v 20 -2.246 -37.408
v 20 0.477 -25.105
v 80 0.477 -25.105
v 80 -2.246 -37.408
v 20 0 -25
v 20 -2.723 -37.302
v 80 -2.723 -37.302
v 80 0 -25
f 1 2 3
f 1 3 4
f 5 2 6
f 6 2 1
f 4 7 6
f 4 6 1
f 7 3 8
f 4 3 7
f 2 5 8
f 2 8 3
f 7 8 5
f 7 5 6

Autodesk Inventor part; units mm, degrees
ref_plane "YZ Plane" through (0, 0, 0) normal (1, 0, 0) x (0, 1, 0)
ref_plane "XZ Plane" through (0, 0, 0) normal (0, 1, 0) x (-1, 0, 0)
ref_plane "XY Plane" through (0, 0, 0) normal (0, 0, 1) x (1, 0, 0)
sketch "Szkic1" plane through (0, 0, 0) normal (0, 1, 0) x (-1, 0, 0)
  line L0 (0, 0) -> (-100, 0)
  line L1 (-100, 0) -> (-100, -14)
  line L2 (-100, -14) -> (0, -14)
  line L3 (0, -14) -> (0, 0)
  dimension "d0" = 100
  dimension "d1" = 14
extrude "Wyciągnięcie proste1" add sketch "Szkic1" along normal blind 0.5
sketch "Szkic2" plane through (0, 0.5, 0) normal (0, 1, 0) x (1, 0, 0)
  line L0 (100, 14) -> (0, 14) projected
  line L1 (80, 14) -> (20, 14)
  line L2 (20, 14) -> (20, 25)
  line L3 (20, 25) -> (80, 25)
  line L4 (80, 25) -> (80, 14)
  point P0 (0, 0)
  point P1 (50, 14)
  point P2 (50, 14)
  point P3 (50, 14)
  dimension "d4" = 60
  dimension "d5" = 11
extrude "Wyciągnięcie proste2" add sketch "Szkic2" against normal blind 0.5
sketch "Szkic3" plane through (80, 0.5, -14) normal (1, 0, 0) x (0, 0, -1)
  line L0 (0, 0) -> (11, 0) projected
  line L1 (0, -0.5) -> (0, 0) projected
  line L2 (11, -0.5) -> (0, -0.5) projected
  line L3 (11, 0) -> (11, -0.5) projected
  line L4 (11, 0) -> (23.4078, -2.7462)
  line L5 (11, -0.5) -> (23.3023, -3.2228)
  line L6 (23.3023, -3.2228) -> (23.4078, -2.7462)
  point P0 (-14, -0.5)
  dimension "d8" = 167.52
  dimension "d9" = 12.6
extrude "Wyciągnięcie proste3" add sketch "Szkic3" against normal up to surface (60 mm away) contours L4 L6 L5 L3
sketch "Szkic4" plane through (20, 0, -14) normal (-1, 0, 0) x (0, 0, 1)
  line L0 (-11, 0.5) -> (0, 0.5) projected
  line L1 (0, 0) -> (-11, 0) projected
  line L2 (0, 0.5) -> (14, 0.5) projected
  line L3 (0, 0) -> (14, 0) projected
  line L4 (0, 0) -> (14, 0) projected
  line L5 (14, 0) -> (14, 0.5) projected
  line L6 (0, 0.5) -> (14, 0.5) projected
  line L7 (0, 0) -> (0, 0.5) projected
  line L8 (-11, 0.5) -> (0, 0.5) projected
  line L9 (-23.4078, -2.2462) -> (-11, 0.5) projected
  line L10 (-23.3023, -2.7228) -> (-23.4078, -2.2462) projected
  line L11 (-11, 0) -> (-23.3023, -2.7228) projected
  line L12 (0, 0) -> (-11, 0) projected
  line L13 (0, 0.5) -> (0, 0) projected
  line L14 (-11, 0) -> (-23.3023, -2.7228) projected
  line L15 (-11, 0) -> (-11.1055, 0.4767)
extrude "Wyciągnięcie proste4" cut sketch "Szkic4" along normal through all both and the other way through all contours L0 L7 L1 L15 L9 | L2 L5 L3 L7
sketch "Szkic5" plane through (20, -2.7228, -37.3023) normal (-1, 0, 0) x (0, 0.2161, 0.9764)
  line L0 (15.5701, -17.2757) -> (12.57, -20.2756) projected
  line L1 (15.5701, -17.2757) -> (15.5704, -10.8597) projected
  line L2 (15.5708, -3.4757) -> (15.5704, -10.8597) projected
  point P0 (37.0093, -5.4025)
properties part number "tyl" material "Stal miękka, spawana"
